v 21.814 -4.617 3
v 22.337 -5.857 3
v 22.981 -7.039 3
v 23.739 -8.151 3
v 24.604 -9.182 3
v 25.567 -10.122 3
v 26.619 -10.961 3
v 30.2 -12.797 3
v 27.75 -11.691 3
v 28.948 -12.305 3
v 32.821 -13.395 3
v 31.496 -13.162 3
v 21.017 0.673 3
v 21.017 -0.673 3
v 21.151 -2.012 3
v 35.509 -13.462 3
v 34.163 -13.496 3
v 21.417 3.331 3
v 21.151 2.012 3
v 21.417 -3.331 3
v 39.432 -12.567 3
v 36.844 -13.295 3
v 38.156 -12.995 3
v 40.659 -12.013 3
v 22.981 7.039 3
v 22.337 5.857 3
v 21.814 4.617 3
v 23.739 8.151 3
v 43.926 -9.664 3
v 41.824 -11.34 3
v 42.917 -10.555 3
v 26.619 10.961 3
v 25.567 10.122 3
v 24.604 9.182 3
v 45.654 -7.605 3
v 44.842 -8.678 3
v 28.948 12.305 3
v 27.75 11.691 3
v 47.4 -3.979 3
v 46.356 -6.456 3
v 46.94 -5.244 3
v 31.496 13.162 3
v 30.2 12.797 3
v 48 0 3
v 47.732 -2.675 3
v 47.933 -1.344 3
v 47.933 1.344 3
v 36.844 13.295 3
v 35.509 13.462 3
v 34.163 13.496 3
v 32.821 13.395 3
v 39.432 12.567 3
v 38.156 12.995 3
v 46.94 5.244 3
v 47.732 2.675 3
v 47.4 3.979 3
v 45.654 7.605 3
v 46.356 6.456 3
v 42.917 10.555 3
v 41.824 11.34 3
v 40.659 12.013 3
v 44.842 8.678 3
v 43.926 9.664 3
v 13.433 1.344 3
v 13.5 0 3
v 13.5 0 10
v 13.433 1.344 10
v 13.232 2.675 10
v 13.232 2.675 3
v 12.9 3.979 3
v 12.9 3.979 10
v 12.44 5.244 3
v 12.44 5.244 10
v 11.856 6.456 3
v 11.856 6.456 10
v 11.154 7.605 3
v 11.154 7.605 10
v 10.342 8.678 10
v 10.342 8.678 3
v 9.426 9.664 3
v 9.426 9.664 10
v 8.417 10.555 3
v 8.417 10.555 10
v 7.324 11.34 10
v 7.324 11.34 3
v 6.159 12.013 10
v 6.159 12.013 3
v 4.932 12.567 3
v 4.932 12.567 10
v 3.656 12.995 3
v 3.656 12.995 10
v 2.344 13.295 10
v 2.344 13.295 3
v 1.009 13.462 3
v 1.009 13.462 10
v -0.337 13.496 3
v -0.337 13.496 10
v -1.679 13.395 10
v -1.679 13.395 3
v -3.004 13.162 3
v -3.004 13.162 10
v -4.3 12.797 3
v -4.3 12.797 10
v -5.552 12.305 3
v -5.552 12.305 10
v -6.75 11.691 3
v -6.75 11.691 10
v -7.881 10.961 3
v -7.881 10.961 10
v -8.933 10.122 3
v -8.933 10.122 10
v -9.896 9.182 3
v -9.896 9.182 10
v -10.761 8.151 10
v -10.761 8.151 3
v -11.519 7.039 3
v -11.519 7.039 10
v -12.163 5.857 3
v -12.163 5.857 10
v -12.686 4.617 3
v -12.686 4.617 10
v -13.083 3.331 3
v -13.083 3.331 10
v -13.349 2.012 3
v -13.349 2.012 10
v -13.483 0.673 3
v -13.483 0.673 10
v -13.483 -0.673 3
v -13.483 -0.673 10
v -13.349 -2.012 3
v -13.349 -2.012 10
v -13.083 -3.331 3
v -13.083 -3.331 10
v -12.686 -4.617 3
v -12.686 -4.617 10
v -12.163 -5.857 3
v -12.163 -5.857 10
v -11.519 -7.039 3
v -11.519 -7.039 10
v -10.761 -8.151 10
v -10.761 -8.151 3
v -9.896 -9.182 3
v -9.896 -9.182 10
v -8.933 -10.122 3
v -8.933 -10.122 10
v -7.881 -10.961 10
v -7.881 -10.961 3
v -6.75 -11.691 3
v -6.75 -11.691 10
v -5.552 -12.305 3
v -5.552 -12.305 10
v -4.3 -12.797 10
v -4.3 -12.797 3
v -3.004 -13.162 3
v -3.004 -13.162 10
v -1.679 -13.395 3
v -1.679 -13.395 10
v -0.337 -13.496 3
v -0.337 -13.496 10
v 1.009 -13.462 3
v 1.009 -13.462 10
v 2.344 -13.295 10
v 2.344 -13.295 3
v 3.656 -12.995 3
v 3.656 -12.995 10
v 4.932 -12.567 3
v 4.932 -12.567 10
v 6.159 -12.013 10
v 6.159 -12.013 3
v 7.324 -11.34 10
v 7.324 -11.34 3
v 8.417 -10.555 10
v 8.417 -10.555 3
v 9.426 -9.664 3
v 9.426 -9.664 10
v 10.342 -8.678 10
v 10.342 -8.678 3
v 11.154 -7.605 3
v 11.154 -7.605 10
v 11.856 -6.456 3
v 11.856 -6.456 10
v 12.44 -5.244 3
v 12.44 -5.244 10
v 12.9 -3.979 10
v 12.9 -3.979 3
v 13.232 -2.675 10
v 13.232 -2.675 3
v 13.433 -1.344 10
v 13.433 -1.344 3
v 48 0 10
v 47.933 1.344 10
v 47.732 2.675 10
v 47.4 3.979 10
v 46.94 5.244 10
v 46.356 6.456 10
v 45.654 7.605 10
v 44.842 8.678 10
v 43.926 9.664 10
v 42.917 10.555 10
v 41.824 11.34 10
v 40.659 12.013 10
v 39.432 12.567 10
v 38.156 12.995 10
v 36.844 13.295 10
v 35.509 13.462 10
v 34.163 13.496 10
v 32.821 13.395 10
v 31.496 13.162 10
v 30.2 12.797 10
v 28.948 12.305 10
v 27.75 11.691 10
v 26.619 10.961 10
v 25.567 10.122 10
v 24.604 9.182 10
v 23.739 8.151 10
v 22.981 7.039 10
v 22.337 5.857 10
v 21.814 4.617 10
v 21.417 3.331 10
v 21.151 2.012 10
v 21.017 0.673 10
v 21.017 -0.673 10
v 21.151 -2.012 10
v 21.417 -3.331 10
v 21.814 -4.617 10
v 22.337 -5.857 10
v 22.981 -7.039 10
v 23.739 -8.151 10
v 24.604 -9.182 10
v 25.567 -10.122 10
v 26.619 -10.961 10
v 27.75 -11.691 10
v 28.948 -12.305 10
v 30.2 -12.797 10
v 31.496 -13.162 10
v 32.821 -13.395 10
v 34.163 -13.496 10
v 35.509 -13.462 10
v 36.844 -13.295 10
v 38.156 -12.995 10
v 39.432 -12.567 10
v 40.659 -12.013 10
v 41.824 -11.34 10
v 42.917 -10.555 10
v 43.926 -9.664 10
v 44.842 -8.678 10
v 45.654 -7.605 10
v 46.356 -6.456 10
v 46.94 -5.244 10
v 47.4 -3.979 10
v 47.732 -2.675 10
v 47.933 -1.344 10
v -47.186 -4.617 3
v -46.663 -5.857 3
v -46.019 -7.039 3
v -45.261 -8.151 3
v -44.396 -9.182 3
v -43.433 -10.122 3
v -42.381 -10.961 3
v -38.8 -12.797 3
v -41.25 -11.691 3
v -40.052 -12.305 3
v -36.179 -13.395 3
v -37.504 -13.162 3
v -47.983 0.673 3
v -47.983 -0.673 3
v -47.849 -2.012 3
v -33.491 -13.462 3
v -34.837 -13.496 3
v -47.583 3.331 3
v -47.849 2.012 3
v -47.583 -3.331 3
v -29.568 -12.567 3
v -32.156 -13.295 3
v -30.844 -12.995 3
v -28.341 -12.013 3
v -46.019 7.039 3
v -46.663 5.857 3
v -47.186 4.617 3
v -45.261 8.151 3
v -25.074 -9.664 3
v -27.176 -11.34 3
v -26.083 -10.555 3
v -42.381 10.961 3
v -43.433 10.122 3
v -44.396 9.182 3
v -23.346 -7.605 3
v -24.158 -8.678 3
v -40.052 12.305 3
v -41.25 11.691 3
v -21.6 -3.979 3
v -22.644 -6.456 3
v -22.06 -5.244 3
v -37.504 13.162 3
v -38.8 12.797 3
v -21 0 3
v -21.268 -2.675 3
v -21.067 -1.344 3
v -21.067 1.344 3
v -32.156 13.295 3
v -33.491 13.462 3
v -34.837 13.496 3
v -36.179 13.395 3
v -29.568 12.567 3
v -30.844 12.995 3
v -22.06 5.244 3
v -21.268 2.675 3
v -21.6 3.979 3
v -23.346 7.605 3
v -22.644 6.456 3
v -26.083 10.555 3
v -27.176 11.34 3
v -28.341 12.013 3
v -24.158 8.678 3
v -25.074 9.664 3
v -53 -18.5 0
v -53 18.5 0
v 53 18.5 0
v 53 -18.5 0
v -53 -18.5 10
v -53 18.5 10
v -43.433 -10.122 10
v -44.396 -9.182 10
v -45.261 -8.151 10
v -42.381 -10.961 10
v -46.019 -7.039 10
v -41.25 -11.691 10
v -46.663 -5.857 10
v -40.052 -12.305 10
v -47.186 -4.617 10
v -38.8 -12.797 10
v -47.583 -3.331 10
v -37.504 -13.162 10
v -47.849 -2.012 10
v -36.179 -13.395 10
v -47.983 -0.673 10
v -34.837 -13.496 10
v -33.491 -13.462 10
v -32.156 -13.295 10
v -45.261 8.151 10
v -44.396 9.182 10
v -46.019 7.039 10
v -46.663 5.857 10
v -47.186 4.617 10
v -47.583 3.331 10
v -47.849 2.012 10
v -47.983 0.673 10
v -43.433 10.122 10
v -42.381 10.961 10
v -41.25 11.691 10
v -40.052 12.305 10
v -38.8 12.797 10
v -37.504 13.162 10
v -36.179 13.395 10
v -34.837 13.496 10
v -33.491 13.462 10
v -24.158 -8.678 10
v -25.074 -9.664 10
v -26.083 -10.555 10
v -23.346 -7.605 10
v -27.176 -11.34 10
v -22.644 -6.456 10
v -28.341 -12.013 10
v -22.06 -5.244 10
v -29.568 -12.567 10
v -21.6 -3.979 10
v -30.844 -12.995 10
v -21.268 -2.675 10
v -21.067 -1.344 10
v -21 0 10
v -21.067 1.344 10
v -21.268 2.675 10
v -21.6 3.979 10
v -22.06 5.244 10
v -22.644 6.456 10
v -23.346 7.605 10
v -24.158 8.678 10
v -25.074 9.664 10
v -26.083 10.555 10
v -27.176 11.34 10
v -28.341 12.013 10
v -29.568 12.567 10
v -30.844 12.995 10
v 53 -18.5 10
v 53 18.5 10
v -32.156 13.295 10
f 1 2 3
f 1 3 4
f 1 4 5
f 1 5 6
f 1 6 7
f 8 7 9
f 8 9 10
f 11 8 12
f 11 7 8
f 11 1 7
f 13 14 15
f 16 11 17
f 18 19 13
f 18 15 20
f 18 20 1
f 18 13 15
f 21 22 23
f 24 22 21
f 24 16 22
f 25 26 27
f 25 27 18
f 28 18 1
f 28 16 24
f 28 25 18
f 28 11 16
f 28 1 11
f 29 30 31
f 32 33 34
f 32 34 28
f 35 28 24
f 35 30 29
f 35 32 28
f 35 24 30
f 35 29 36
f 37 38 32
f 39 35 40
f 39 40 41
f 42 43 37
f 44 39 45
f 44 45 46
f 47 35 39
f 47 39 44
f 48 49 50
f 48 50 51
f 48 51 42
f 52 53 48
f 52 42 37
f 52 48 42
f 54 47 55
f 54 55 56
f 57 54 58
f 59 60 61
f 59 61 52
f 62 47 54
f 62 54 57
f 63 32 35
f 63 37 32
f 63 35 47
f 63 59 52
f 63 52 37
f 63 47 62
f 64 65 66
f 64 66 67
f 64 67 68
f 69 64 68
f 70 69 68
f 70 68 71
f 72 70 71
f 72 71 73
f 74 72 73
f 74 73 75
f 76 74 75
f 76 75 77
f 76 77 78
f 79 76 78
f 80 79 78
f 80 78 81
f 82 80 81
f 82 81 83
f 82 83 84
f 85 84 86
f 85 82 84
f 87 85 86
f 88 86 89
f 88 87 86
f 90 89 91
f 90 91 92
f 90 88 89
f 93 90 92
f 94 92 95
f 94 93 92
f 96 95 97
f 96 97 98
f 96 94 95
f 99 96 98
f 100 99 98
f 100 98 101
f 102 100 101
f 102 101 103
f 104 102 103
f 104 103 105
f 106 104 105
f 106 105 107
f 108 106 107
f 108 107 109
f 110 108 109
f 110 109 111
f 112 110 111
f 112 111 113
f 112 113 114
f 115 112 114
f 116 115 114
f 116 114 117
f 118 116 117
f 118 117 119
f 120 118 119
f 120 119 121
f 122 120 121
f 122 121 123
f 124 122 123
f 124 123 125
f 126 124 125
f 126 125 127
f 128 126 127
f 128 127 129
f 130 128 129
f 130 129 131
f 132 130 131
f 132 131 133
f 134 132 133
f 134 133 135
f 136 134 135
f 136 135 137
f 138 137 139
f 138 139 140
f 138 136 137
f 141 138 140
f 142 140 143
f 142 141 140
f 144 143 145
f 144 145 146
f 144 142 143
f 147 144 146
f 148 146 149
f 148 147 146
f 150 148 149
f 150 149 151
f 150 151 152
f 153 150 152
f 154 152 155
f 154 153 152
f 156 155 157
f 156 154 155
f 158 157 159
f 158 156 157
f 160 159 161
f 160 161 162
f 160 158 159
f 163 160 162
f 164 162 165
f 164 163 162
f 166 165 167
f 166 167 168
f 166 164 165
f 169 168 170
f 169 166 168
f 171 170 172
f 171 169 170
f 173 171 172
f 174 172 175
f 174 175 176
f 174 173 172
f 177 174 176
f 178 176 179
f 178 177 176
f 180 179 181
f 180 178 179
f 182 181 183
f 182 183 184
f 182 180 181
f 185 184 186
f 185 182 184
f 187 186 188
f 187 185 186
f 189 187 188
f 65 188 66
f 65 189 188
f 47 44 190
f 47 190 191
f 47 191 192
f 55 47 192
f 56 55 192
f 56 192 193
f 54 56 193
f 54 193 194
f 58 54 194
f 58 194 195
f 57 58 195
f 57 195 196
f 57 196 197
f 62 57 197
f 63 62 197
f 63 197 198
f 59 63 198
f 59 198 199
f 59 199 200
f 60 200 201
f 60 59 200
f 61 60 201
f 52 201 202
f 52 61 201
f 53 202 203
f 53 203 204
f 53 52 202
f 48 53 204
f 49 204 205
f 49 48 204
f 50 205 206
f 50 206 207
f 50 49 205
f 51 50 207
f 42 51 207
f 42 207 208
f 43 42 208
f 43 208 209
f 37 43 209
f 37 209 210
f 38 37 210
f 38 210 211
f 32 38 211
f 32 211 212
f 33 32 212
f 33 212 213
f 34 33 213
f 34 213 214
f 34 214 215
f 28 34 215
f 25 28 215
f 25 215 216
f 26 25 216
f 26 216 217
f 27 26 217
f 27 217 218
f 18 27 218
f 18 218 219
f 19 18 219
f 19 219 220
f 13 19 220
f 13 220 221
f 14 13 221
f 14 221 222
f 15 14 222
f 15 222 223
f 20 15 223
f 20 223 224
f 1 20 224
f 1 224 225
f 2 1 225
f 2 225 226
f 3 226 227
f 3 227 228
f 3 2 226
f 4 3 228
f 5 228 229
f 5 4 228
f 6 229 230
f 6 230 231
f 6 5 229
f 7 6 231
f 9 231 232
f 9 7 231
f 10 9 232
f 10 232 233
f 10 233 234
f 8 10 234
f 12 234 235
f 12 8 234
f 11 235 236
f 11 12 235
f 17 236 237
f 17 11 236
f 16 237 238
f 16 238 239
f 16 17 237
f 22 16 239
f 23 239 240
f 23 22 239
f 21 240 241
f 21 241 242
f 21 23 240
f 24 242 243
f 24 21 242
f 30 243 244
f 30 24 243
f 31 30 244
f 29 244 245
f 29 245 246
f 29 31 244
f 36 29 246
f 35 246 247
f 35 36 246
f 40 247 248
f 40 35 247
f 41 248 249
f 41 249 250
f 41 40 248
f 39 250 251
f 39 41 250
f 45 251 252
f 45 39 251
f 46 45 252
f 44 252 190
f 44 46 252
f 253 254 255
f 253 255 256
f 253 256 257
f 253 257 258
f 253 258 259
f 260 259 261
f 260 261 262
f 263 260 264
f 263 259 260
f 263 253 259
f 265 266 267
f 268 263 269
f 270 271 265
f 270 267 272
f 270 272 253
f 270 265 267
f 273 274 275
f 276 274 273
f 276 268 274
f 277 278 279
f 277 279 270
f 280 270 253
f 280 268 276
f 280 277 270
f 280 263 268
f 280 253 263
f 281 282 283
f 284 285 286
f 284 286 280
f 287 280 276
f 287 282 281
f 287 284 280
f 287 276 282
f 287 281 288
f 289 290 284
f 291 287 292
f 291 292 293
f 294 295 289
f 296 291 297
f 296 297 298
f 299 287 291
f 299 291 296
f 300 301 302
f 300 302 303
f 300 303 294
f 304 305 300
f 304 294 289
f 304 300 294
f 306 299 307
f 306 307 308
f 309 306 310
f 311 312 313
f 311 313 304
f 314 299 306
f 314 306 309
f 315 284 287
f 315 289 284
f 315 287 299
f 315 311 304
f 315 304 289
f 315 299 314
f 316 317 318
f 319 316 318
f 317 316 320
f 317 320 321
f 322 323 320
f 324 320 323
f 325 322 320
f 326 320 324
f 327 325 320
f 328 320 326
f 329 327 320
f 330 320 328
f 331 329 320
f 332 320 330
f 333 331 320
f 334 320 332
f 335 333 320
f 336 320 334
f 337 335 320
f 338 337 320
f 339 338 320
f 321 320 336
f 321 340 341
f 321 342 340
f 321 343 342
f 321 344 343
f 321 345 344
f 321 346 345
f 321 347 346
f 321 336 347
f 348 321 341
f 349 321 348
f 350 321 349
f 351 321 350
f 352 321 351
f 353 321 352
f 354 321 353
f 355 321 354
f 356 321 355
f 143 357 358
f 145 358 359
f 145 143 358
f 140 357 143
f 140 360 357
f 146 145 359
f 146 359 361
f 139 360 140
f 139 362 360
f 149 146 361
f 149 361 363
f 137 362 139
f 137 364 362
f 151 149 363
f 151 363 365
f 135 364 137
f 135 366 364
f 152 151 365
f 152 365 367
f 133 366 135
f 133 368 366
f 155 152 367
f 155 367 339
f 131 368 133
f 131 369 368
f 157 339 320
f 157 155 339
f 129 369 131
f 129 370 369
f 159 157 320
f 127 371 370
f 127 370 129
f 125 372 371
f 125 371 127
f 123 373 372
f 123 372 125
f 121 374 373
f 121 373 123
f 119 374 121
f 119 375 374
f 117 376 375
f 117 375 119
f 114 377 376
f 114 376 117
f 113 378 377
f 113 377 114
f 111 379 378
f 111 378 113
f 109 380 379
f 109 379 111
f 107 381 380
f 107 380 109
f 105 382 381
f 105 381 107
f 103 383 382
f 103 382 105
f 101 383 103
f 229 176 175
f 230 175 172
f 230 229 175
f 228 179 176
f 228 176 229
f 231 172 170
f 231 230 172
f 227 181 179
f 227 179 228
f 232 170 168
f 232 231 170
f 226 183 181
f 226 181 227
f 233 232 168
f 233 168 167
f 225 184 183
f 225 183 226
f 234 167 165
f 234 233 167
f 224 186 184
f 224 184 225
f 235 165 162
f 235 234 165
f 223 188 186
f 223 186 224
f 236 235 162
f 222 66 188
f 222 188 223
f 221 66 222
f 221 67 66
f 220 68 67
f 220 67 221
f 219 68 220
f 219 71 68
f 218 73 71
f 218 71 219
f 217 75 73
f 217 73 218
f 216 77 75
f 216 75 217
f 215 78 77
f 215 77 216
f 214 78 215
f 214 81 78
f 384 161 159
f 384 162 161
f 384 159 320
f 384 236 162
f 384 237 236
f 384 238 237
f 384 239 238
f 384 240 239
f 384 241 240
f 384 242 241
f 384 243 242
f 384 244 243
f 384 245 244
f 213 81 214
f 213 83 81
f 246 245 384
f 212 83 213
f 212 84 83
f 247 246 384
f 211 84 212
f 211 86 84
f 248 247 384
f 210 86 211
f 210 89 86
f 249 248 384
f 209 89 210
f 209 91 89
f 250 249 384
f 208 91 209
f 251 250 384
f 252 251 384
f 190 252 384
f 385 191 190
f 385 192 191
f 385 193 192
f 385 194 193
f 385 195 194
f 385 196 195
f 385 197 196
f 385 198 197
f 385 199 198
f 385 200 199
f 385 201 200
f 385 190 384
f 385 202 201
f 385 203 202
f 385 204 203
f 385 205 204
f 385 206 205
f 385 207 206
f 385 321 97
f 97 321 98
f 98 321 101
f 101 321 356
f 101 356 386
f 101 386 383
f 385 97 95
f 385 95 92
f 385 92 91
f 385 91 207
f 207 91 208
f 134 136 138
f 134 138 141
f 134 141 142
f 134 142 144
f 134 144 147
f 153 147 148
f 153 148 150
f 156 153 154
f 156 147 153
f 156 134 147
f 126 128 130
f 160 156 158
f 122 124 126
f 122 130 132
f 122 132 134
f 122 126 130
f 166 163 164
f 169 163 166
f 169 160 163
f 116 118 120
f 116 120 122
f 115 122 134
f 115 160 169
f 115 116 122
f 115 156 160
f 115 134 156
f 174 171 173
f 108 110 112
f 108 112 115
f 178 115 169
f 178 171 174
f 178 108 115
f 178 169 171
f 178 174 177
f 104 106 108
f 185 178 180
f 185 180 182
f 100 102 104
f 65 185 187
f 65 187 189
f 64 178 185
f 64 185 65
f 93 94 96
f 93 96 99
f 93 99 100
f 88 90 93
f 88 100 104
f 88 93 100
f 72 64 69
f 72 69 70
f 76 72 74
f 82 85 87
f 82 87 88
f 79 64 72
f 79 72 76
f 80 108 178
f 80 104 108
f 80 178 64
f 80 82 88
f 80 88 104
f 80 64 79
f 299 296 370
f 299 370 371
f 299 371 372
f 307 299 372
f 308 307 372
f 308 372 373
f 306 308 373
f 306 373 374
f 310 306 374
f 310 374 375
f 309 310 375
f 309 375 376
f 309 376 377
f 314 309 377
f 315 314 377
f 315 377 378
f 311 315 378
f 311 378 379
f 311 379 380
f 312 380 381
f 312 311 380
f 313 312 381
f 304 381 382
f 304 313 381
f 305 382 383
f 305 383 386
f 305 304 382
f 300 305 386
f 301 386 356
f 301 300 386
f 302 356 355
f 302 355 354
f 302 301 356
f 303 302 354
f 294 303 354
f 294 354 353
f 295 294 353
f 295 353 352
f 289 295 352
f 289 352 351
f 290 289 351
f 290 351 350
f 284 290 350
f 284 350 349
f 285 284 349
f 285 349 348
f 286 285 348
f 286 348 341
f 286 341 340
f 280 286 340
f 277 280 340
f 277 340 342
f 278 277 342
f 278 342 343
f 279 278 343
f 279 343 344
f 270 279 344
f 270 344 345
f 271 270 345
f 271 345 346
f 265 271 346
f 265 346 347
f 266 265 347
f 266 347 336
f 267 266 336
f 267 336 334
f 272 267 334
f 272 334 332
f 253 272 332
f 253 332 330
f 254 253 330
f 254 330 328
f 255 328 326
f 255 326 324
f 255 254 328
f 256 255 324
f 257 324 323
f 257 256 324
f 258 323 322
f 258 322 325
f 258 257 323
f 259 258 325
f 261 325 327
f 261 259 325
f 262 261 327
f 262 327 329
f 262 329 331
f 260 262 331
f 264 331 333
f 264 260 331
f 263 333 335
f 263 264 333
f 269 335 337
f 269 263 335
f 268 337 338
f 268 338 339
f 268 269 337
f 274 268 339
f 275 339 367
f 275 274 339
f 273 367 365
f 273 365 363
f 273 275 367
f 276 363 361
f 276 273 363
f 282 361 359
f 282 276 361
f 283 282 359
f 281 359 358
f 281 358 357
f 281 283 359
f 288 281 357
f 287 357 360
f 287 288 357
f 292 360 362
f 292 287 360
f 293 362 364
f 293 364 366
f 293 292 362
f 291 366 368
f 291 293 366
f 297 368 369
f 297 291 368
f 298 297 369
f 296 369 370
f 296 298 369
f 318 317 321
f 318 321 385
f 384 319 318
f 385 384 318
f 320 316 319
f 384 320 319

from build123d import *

# Parameters (mm, degrees)
F0_W     = 106
F0_H     = 37
F0_R     = 13.5
F1_DEPTH = 10
F2_DEPTH = 3


with BuildPart() as f1:
    # F0 (on Top) → F1 (new body)
    with BuildSketch(Plane.XY):
        Rectangle(F0_W, F0_H)
        with Locations((-34.5, 0)):
            Circle(F0_R, mode=Mode.SUBTRACT)
        Circle(F0_R, mode=Mode.SUBTRACT)
        with Locations((34.5, 0)):
            Circle(F0_R, mode=Mode.SUBTRACT)
    extrude(amount=F1_DEPTH)

    # F0 (on Top) → F2 (join)
    with BuildSketch(Plane.XY):
        Circle(F0_R)
        with Locations((-34.5, 0)):
            Circle(F0_R)
        with Locations((34.5, 0)):
            Circle(F0_R)
    extrude(amount=F2_DEPTH)


solid = f1.part
